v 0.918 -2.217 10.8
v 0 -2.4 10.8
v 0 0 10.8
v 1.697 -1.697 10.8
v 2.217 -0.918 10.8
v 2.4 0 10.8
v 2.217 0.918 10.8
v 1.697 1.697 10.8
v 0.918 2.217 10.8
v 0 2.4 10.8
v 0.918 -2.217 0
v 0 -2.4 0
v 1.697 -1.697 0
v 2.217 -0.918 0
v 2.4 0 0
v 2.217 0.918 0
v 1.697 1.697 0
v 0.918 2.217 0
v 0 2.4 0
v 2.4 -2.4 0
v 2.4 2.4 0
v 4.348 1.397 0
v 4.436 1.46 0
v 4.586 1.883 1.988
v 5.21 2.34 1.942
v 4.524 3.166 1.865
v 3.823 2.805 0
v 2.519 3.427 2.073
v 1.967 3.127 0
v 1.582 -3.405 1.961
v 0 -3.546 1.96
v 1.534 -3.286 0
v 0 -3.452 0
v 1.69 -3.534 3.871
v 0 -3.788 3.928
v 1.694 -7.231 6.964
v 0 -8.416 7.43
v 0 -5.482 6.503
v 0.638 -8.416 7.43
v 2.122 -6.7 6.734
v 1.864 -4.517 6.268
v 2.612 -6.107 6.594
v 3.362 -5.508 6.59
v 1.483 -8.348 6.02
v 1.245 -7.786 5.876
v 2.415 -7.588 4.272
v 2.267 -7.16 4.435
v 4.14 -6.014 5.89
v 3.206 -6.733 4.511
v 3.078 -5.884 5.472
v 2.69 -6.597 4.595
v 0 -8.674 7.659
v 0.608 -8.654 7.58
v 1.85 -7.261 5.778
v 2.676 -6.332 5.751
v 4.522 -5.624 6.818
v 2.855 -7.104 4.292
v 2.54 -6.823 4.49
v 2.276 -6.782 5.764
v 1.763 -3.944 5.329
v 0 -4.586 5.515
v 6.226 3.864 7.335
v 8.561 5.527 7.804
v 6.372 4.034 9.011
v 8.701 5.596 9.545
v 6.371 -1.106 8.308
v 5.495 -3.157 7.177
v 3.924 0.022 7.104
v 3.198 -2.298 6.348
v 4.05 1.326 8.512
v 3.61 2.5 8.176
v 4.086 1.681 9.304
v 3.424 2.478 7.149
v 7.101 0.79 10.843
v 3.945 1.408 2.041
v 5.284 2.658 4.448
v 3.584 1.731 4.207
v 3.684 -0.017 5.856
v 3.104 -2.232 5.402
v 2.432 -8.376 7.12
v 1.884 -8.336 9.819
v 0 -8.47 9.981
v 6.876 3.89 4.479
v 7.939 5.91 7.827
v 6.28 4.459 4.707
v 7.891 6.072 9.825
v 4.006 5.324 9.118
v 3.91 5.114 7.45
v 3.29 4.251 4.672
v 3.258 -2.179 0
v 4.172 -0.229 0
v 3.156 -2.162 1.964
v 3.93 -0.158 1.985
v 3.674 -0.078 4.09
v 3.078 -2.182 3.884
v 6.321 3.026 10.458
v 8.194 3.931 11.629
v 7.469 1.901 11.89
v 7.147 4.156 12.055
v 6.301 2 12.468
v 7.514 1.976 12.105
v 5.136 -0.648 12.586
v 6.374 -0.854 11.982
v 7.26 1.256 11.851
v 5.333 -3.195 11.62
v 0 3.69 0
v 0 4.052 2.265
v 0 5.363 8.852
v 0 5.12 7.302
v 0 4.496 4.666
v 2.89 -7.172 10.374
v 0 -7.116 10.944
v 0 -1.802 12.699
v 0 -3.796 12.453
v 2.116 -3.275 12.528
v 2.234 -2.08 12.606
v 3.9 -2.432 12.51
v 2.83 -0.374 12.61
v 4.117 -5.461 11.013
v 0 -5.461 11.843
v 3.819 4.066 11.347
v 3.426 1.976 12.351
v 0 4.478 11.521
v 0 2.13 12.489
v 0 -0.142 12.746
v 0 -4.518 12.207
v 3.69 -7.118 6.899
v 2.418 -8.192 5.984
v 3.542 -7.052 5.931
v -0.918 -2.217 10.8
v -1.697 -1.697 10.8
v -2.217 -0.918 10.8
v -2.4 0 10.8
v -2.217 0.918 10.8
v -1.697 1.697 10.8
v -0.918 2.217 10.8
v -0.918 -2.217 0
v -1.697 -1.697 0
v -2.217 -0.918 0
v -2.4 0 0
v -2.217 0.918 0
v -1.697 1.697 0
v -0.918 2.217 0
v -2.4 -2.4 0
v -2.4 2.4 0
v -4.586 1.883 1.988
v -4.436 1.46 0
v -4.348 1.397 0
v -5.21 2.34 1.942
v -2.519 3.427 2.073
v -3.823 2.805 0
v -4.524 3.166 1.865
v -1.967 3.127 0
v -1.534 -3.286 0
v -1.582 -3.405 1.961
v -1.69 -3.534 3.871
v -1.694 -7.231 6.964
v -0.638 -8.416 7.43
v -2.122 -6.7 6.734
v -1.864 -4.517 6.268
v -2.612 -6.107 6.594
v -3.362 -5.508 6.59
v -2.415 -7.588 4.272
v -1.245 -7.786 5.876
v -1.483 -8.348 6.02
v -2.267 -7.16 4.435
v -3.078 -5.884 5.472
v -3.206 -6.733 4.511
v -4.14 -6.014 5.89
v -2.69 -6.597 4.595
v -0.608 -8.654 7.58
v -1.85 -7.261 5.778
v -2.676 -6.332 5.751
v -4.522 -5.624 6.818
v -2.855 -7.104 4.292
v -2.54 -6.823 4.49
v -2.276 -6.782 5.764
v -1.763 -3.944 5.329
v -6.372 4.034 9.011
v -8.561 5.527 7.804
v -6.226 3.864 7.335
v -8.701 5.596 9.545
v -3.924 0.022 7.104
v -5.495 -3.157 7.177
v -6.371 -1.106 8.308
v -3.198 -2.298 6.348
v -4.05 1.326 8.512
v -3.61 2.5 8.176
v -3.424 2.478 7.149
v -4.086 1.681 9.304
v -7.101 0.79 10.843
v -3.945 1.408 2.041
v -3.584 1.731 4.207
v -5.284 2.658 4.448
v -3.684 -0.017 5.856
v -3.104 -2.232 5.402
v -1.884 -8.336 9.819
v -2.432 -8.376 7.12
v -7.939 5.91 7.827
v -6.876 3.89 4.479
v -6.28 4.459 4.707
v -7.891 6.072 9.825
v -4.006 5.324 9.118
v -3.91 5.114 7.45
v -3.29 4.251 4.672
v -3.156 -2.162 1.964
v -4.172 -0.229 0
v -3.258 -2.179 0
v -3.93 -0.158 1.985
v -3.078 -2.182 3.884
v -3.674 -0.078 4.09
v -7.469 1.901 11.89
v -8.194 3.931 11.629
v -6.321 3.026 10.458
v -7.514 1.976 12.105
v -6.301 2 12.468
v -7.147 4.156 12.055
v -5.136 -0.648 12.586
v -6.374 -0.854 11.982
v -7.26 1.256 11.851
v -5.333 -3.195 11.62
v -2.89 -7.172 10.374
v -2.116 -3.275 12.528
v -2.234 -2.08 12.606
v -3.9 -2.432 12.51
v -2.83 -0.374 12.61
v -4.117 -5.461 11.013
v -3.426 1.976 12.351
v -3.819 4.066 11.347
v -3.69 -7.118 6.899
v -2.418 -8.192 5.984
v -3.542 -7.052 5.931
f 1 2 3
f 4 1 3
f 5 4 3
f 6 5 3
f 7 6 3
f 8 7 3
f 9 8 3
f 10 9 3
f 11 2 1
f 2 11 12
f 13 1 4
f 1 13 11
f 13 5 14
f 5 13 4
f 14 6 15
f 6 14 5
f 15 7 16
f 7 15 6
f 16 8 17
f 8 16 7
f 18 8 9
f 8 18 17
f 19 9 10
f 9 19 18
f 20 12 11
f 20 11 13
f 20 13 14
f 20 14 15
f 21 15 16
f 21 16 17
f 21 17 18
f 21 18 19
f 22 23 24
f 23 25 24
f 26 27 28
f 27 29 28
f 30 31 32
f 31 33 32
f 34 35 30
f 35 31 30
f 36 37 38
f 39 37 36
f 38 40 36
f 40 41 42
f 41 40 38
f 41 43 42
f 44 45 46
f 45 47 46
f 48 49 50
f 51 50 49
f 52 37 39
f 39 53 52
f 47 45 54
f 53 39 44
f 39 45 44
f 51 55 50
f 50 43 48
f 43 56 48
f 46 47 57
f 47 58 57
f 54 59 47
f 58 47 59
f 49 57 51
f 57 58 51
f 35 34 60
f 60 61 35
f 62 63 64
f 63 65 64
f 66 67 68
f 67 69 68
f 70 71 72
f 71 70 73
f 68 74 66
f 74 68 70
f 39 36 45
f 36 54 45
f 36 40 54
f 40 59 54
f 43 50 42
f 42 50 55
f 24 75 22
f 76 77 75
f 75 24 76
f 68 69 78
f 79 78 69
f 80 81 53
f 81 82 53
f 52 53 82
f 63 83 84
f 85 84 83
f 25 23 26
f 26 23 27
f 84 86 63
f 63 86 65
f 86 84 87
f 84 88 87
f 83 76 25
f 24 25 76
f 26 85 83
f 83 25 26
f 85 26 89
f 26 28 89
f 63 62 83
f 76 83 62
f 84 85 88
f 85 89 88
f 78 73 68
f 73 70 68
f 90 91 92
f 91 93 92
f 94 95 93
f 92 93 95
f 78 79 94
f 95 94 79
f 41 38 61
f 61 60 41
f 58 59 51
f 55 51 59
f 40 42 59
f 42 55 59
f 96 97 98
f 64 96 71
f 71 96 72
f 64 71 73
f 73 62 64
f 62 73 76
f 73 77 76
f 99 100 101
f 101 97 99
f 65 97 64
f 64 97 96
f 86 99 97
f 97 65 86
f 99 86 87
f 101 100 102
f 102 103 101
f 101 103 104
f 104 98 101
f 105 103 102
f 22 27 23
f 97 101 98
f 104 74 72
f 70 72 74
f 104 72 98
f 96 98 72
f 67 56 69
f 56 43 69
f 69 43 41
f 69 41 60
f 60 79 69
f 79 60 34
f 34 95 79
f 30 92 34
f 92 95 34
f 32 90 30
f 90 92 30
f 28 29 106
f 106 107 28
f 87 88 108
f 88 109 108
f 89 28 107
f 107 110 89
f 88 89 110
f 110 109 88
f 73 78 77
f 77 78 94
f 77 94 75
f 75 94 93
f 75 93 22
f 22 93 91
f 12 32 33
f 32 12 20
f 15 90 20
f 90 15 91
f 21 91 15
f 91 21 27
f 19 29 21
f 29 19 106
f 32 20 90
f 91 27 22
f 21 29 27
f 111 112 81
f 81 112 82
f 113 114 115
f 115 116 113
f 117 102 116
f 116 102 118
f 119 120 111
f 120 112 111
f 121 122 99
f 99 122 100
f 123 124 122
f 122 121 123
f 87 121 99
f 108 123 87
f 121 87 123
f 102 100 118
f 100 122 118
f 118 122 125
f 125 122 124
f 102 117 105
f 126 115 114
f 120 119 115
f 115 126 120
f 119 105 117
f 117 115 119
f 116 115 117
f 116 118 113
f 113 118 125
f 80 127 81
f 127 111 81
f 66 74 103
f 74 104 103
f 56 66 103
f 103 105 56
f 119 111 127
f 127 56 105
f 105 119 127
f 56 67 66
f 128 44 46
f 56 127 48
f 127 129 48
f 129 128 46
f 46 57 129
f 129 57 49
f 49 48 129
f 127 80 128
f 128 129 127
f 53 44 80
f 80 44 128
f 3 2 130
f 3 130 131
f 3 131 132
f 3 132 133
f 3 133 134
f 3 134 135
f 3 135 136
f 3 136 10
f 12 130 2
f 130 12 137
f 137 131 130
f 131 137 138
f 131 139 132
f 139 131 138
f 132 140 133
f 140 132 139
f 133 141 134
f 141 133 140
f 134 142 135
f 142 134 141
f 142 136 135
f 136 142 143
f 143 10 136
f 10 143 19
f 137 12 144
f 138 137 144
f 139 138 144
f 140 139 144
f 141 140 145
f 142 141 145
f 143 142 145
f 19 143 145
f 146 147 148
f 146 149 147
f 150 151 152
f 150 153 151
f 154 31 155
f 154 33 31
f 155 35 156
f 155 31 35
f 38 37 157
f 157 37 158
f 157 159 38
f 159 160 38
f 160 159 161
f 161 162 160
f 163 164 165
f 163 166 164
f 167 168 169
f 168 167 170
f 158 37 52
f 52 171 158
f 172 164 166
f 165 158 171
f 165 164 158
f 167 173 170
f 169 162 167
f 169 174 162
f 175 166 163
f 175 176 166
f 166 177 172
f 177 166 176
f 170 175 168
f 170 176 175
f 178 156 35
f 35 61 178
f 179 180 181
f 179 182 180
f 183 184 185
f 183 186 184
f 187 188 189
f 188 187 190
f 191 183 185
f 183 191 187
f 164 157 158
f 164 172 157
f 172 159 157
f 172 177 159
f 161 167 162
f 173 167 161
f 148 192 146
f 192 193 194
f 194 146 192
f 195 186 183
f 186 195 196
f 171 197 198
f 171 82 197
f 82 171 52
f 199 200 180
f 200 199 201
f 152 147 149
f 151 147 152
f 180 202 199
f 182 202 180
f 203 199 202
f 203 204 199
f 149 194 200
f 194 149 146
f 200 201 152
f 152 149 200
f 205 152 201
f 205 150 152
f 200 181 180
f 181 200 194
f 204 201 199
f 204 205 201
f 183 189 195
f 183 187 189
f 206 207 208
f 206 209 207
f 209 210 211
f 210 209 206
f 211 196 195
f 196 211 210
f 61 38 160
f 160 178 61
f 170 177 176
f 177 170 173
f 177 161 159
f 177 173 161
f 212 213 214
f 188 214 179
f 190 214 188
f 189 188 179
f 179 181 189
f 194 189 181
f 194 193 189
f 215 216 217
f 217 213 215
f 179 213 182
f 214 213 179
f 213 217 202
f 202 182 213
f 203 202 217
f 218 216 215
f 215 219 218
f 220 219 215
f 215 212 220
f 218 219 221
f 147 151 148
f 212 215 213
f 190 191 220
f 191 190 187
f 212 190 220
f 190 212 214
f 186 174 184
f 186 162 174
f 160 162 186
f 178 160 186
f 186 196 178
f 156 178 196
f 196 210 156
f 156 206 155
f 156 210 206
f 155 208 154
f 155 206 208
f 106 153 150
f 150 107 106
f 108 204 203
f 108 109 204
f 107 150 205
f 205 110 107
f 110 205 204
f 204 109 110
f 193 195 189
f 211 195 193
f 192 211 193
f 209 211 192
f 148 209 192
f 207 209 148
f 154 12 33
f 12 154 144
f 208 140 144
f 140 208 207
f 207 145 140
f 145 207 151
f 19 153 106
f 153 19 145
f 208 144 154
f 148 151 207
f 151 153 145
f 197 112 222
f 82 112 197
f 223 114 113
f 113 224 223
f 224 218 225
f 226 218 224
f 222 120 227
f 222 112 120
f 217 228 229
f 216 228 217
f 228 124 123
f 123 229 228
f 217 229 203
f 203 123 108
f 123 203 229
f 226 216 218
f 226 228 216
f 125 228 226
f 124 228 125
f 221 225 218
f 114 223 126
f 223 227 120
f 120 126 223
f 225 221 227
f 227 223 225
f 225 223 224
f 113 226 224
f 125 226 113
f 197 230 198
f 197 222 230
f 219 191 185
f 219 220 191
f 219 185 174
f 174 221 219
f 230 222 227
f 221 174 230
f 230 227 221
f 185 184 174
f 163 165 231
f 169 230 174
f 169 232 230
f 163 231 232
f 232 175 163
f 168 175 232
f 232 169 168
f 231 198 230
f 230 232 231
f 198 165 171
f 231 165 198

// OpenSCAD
use <../lib.scad>
use <s/98150s01.scad>
use <s/98150s02.scad>
use <s/98150s03.scad>
use <s/98150s04.scad>
function ldraw_lib__98150() = [
// 0 Minifig Head Snake Cobra
// 0 Name: 98150.dat
// 0 Author: Philippe Hurbain [Philo]
// 0 !LDRAW_ORG Part UPDATE 2024-09
// 0 !LICENSE Licensed under CC BY 4.0 : see CAreadme.txt
// 
// 0 BFC CERTIFY CCW
  [0,"BFC","CERTIFY"],
  [0,"BFC","CCW"],
// 
// 0 !KEYWORDS Ninjago, serpentine
// 
// 0 !HISTORY 2013-08-14 {LEGO Digital Designer} Original part shape
// 0 !HISTORY 2021-02-16 [Philo] File preparation for LDraw Parts Tracker
// 0 !HISTORY 2024-10-27 [OrionP] Official Update 2024-09
// 
// 
// 1 16 0 0 0 1 0 0 0 1 0 0 0 1 s\98150s01.dat
  [1,16,0,0,0,1,0,0,0,1,0,0,0,1, ldraw_lib__s__98150s01()],
// 1 16 0 0 0 1 0 0 0 1 0 0 0 1 s\98150s03.dat
  [1,16,0,0,0,1,0,0,0,1,0,0,0,1, ldraw_lib__s__98150s03()],
// 1 16 0 0 0 1 0 0 0 1 0 0 0 1 s\98150s02.dat
  [1,16,0,0,0,1,0,0,0,1,0,0,0,1, ldraw_lib__s__98150s02()],
// 1 16 0 0 0 1 0 0 0 1 0 0 0 1 s\98150s04.dat
  [1,16,0,0,0,1,0,0,0,1,0,0,0,1, ldraw_lib__s__98150s04()],
// 1 16 0 0 0 -1 0 0 0 1 0 0 0 1 s\98150s01.dat
  [1,16,0,0,0,-1,0,0,0,1,0,0,0,1, ldraw_lib__s__98150s01()],
// 1 16 0 0 0 -1 0 0 0 1 0 0 0 1 s\98150s03.dat
  [1,16,0,0,0,-1,0,0,0,1,0,0,0,1, ldraw_lib__s__98150s03()],
// 1 16 0 0 0 -1 0 0 0 1 0 0 0 1 s\98150s02.dat
  [1,16,0,0,0,-1,0,0,0,1,0,0,0,1, ldraw_lib__s__98150s02()],
// 1 16 0 0 0 -1 0 0 0 1 0 0 0 1 s\98150s04.dat
  [1,16,0,0,0,-1,0,0,0,1,0,0,0,1, ldraw_lib__s__98150s04()],
];
module ldraw_lib__98150(step=0, col=false, unit=2/5, alt=false, line=0.2, solid=!$preview)
    makepoly(ldraw_lib__98150(), step=step, col=col, unit=unit, alt=alt, line=line, solid=solid);
ldraw_lib__98150(line=0.2);
